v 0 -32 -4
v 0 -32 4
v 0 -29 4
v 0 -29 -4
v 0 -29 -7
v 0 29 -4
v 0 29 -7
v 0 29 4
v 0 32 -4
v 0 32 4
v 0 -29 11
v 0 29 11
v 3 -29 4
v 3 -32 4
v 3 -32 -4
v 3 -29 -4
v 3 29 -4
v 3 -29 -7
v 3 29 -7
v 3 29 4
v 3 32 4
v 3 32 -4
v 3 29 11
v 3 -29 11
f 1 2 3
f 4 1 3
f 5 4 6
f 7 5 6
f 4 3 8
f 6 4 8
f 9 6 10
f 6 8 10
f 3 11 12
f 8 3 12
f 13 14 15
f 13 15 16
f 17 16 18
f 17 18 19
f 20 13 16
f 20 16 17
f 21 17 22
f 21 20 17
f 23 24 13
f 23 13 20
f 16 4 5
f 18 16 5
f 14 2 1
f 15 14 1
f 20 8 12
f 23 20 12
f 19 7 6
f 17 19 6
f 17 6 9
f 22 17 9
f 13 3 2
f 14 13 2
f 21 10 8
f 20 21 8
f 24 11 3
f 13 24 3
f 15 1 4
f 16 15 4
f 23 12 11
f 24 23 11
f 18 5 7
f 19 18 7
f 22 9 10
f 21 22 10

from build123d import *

# Parameters (mm, degrees)
F1_DEPTH = 3


with BuildPart() as f1:
    # F0 (on Right) → F1 (new body)
    with BuildSketch(Plane.YZ):
        Polygon((-32, 4), (-32, 0), (-32, -4), (-29, -4), (-29, -7), (0, -7), (29, -7), (29, -4), (32, -4), (32, 0), (32, 4), (29, 4), (29, 11), (0, 11), (-29, 11), (-29, 4), align=None)
    extrude(amount=F1_DEPTH)


solid = f1.part
